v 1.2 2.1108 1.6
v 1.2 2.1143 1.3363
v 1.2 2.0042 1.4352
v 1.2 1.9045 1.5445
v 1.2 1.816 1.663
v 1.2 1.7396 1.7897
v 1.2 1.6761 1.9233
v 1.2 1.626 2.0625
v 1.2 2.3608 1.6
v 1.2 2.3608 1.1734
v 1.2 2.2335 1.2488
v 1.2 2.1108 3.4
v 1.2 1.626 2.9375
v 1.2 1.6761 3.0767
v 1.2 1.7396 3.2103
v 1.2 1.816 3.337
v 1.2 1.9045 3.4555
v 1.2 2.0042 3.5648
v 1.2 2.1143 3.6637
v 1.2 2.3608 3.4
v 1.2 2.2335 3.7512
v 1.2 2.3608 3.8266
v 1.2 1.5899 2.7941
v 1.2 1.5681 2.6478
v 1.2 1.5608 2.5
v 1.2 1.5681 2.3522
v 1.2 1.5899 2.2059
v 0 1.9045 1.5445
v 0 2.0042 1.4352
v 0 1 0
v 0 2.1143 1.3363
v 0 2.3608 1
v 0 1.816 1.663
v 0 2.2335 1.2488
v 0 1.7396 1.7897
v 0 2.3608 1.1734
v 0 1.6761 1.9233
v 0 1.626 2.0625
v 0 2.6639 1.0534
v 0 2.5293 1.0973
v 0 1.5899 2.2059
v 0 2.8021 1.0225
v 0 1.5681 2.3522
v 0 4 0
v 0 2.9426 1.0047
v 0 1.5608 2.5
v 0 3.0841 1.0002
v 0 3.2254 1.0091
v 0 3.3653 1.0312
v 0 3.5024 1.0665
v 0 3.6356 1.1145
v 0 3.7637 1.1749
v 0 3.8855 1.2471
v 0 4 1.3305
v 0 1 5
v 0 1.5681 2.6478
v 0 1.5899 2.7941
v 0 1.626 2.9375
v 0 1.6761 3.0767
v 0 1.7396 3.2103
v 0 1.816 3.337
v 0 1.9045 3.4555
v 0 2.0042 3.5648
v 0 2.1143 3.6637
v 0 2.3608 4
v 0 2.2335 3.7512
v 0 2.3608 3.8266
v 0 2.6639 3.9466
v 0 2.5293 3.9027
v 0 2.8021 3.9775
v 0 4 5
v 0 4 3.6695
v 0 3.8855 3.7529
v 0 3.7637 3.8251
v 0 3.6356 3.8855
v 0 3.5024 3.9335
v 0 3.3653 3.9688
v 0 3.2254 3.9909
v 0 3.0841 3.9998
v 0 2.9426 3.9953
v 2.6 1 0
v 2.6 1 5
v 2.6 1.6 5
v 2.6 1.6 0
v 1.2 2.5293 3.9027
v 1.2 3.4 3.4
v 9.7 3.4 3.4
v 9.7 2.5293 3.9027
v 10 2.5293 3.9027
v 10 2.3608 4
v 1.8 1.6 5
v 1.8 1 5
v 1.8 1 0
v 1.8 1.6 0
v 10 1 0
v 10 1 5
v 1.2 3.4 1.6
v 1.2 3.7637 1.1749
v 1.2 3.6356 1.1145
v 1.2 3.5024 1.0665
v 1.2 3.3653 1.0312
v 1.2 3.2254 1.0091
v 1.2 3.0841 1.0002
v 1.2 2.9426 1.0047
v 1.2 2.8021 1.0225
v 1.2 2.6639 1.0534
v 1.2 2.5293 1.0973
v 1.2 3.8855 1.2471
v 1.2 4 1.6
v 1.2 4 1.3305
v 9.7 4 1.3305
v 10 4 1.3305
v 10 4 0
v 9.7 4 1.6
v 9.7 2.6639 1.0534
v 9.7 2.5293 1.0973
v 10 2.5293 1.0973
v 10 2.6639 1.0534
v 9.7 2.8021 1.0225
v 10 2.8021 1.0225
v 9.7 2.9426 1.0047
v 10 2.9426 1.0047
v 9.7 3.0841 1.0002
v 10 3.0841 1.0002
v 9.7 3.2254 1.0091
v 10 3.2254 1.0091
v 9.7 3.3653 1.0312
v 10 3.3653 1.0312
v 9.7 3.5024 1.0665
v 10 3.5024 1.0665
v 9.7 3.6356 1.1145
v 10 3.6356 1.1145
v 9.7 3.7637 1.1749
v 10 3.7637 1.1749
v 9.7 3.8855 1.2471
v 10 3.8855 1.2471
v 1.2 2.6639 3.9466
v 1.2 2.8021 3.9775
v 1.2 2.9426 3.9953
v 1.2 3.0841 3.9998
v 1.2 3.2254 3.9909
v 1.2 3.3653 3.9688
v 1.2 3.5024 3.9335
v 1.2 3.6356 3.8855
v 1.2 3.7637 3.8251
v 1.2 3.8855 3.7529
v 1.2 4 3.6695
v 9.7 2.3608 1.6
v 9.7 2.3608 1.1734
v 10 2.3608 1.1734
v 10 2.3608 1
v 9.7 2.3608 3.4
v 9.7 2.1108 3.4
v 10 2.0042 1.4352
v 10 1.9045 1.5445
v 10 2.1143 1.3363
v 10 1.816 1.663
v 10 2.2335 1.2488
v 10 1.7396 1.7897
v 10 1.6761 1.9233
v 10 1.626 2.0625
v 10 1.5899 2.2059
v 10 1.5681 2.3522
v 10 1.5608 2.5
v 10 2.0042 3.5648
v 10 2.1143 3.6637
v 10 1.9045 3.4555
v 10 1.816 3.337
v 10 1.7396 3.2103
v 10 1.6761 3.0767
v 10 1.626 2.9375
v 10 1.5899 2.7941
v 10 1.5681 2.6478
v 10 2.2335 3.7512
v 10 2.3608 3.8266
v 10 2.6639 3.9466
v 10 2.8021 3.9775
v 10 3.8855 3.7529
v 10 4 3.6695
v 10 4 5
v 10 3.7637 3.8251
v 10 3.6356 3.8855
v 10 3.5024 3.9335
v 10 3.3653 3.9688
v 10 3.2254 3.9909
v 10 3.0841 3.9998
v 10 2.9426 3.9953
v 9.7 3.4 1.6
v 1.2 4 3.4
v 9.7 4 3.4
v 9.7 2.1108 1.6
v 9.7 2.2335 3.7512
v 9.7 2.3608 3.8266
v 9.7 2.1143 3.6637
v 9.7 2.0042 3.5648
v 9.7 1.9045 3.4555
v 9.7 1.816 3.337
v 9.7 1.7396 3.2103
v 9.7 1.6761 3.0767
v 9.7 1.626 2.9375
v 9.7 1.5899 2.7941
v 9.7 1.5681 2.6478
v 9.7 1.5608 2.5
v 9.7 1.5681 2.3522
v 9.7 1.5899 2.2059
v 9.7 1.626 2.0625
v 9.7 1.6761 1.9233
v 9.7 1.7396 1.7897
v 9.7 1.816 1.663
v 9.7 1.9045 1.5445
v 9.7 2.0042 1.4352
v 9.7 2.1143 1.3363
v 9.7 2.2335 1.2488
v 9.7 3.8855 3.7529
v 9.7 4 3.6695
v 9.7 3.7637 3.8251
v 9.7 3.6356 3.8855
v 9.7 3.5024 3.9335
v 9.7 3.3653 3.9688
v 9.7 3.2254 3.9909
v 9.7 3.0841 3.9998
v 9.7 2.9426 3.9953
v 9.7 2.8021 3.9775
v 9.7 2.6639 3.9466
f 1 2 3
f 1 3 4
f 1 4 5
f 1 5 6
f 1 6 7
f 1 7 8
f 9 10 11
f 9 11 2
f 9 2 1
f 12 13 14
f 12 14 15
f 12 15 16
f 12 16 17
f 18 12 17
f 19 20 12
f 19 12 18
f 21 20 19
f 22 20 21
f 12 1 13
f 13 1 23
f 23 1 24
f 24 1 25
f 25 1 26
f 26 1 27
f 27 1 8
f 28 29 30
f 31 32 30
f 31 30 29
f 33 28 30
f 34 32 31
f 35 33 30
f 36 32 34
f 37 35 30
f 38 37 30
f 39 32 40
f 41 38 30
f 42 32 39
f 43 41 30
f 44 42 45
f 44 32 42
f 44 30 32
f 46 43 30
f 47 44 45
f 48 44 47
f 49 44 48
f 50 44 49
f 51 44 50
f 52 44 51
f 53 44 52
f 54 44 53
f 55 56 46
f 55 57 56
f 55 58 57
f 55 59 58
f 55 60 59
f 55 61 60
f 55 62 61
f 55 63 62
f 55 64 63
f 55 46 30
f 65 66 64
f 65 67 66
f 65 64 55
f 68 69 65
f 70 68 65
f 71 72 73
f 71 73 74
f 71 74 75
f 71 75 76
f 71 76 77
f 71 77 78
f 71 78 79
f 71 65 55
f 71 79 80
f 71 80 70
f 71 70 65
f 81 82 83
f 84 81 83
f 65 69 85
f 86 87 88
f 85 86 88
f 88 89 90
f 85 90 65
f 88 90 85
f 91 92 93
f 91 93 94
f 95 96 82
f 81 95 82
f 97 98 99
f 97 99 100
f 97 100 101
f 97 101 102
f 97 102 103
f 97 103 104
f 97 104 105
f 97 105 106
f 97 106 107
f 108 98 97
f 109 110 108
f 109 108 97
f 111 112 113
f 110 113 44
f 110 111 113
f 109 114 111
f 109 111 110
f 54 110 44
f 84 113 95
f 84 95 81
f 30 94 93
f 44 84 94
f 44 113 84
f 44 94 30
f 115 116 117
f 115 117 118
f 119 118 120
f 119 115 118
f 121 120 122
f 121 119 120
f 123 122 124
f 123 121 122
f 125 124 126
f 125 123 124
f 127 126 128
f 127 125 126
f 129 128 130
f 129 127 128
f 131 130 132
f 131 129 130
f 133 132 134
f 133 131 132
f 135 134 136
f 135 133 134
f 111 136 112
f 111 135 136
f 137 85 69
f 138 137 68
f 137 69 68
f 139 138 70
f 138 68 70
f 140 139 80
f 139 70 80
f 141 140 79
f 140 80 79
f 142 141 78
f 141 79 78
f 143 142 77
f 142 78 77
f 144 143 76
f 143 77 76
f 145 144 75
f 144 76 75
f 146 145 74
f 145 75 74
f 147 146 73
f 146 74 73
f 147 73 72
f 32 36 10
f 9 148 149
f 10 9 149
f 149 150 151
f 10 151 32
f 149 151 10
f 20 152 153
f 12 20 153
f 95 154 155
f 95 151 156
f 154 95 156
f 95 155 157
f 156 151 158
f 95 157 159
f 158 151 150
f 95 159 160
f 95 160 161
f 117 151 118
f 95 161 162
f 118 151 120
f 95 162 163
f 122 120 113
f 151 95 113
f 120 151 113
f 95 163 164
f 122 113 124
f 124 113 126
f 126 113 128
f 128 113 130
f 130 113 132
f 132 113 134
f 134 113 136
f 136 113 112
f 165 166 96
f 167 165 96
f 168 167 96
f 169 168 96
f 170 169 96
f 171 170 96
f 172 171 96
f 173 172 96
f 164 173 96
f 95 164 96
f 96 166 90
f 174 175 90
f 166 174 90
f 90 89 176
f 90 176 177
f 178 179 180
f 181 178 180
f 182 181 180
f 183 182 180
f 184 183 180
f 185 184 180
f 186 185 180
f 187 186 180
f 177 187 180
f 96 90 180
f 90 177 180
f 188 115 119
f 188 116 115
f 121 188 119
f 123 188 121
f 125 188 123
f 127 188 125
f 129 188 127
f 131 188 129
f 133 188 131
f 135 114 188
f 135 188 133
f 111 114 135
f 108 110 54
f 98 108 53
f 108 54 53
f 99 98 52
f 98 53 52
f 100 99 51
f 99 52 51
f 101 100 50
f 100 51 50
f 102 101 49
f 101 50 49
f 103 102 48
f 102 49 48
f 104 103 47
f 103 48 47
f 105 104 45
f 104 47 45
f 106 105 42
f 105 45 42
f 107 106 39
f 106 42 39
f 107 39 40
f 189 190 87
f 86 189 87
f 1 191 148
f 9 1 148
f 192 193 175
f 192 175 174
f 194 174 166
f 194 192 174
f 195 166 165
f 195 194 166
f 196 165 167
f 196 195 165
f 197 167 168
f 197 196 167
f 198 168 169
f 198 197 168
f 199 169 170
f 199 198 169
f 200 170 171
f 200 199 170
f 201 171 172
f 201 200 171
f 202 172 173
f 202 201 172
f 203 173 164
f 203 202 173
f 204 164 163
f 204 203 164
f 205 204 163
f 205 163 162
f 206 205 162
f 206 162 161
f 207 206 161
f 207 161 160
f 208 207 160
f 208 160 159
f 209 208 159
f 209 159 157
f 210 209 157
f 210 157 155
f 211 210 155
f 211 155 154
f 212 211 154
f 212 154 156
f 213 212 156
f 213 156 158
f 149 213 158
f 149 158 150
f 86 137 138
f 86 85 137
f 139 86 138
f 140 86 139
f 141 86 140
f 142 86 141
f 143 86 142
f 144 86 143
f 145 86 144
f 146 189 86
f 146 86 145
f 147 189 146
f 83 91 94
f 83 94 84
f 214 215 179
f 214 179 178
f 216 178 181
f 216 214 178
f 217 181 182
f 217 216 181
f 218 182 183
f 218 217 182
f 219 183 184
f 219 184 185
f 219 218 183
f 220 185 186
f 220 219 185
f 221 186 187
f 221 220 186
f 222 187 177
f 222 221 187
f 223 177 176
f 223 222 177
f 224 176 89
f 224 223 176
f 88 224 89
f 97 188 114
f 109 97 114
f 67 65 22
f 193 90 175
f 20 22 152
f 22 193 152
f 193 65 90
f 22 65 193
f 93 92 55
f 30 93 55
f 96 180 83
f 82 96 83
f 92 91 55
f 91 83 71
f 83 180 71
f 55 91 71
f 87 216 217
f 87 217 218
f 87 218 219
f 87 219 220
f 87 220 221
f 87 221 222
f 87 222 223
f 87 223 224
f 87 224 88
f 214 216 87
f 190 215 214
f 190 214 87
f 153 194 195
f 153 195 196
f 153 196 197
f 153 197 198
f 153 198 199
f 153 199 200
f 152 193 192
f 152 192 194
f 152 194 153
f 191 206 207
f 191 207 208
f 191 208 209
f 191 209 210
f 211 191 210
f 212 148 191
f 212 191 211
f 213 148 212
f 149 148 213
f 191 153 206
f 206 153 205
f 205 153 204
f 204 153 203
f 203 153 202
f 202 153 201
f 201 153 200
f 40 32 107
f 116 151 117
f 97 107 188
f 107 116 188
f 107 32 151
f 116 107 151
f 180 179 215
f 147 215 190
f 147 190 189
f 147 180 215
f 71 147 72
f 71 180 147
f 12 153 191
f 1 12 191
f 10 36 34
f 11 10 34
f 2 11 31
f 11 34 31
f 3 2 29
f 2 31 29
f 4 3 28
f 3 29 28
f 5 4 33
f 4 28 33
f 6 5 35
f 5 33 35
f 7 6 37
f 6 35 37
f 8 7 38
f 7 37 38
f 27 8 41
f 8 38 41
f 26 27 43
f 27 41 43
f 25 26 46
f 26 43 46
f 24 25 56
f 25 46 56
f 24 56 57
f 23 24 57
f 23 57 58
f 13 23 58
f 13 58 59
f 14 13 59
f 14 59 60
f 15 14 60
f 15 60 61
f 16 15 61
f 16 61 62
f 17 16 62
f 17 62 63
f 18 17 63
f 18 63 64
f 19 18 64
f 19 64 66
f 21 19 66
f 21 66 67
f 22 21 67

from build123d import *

# Parameters (mm, degrees)
SKETCH1_W           = 10
SKETCH1_H           = 5
BOSS_EXTRUDE1_DEPTH = 3
CUT_EXTRUDE9_DEPTH  = 12.874342087
SKETCH20_R          = 1.5
CUT_EXTRUDE11_DEPTH = 1.2
CUT_EXTRUDE12_START = -0.3
SKETCH22_R          = 1.5
SKETCH22_R_2        = 0.55
CUT_EXTRUDE12_DEPTH = 0.3
SKETCH24_W          = 0.8
SKETCH24_H          = 0.6
CUT_EXTRUDE13_DEPTH = 12.874342087


with BuildPart() as part:
    # Sketch1 → Boss-Extrude1 (new body)
    with BuildSketch(Plane(origin=(0, 4, 0), x_dir=(-1, 0, 0), z_dir=(0, 1, 0))):
        with Locations((-5, 2.5)):
            Rectangle(SKETCH1_W, SKETCH1_H)
    extrude(amount=-BOSS_EXTRUDE1_DEPTH)

    # Sketch18 → Cut-Extrude9 (cut, through all)
    with BuildSketch(Plane(origin=(10, 0, 0), x_dir=(0, 0, -1), z_dir=(1, 0, 0))):
        Polygon((-3.4, 3.4), (-4, 2.360769515), (-3.4, 2.360769515), (-3.4, 2.110769515), (-1.6, 2.110769515), (-1.6, 2.360769515), (-1, 2.360769515), (-1.6, 3.4), (-1.6, 4), (-3.4, 4), align=None)
    extrude(amount=-CUT_EXTRUDE9_DEPTH, mode=Mode.SUBTRACT)

    # Sketch20 → Cut-Extrude11 (cut)
    with BuildSketch(Plane.ZY):
        with Locations((2.5, 3.060769515)):
            Circle(SKETCH20_R)
    extrude(amount=-CUT_EXTRUDE11_DEPTH, mode=Mode.SUBTRACT)

    # Sketch22 → Cut-Extrude12 (cut)
    with BuildSketch(Plane(origin=(10, 0, 0), x_dir=(0, 0, -1), z_dir=(1, 0, 0)).offset(CUT_EXTRUDE12_START)):
        with Locations((-2.5, 3.060769515)):
            Circle(SKETCH22_R)
        with Locations((-2.5, 3.060769515)):
            Circle(SKETCH22_R_2, mode=Mode.SUBTRACT)
    extrude(amount=CUT_EXTRUDE12_DEPTH, mode=Mode.SUBTRACT)

    # Sketch24 → Cut-Extrude13 (cut, through all)
    with BuildSketch(Plane.XY.offset(5)):
        with Locations((2.2, 1.3)):
            Rectangle(SKETCH24_W, SKETCH24_H)
    extrude(amount=-CUT_EXTRUDE13_DEPTH, mode=Mode.SUBTRACT)


solid = part.part
